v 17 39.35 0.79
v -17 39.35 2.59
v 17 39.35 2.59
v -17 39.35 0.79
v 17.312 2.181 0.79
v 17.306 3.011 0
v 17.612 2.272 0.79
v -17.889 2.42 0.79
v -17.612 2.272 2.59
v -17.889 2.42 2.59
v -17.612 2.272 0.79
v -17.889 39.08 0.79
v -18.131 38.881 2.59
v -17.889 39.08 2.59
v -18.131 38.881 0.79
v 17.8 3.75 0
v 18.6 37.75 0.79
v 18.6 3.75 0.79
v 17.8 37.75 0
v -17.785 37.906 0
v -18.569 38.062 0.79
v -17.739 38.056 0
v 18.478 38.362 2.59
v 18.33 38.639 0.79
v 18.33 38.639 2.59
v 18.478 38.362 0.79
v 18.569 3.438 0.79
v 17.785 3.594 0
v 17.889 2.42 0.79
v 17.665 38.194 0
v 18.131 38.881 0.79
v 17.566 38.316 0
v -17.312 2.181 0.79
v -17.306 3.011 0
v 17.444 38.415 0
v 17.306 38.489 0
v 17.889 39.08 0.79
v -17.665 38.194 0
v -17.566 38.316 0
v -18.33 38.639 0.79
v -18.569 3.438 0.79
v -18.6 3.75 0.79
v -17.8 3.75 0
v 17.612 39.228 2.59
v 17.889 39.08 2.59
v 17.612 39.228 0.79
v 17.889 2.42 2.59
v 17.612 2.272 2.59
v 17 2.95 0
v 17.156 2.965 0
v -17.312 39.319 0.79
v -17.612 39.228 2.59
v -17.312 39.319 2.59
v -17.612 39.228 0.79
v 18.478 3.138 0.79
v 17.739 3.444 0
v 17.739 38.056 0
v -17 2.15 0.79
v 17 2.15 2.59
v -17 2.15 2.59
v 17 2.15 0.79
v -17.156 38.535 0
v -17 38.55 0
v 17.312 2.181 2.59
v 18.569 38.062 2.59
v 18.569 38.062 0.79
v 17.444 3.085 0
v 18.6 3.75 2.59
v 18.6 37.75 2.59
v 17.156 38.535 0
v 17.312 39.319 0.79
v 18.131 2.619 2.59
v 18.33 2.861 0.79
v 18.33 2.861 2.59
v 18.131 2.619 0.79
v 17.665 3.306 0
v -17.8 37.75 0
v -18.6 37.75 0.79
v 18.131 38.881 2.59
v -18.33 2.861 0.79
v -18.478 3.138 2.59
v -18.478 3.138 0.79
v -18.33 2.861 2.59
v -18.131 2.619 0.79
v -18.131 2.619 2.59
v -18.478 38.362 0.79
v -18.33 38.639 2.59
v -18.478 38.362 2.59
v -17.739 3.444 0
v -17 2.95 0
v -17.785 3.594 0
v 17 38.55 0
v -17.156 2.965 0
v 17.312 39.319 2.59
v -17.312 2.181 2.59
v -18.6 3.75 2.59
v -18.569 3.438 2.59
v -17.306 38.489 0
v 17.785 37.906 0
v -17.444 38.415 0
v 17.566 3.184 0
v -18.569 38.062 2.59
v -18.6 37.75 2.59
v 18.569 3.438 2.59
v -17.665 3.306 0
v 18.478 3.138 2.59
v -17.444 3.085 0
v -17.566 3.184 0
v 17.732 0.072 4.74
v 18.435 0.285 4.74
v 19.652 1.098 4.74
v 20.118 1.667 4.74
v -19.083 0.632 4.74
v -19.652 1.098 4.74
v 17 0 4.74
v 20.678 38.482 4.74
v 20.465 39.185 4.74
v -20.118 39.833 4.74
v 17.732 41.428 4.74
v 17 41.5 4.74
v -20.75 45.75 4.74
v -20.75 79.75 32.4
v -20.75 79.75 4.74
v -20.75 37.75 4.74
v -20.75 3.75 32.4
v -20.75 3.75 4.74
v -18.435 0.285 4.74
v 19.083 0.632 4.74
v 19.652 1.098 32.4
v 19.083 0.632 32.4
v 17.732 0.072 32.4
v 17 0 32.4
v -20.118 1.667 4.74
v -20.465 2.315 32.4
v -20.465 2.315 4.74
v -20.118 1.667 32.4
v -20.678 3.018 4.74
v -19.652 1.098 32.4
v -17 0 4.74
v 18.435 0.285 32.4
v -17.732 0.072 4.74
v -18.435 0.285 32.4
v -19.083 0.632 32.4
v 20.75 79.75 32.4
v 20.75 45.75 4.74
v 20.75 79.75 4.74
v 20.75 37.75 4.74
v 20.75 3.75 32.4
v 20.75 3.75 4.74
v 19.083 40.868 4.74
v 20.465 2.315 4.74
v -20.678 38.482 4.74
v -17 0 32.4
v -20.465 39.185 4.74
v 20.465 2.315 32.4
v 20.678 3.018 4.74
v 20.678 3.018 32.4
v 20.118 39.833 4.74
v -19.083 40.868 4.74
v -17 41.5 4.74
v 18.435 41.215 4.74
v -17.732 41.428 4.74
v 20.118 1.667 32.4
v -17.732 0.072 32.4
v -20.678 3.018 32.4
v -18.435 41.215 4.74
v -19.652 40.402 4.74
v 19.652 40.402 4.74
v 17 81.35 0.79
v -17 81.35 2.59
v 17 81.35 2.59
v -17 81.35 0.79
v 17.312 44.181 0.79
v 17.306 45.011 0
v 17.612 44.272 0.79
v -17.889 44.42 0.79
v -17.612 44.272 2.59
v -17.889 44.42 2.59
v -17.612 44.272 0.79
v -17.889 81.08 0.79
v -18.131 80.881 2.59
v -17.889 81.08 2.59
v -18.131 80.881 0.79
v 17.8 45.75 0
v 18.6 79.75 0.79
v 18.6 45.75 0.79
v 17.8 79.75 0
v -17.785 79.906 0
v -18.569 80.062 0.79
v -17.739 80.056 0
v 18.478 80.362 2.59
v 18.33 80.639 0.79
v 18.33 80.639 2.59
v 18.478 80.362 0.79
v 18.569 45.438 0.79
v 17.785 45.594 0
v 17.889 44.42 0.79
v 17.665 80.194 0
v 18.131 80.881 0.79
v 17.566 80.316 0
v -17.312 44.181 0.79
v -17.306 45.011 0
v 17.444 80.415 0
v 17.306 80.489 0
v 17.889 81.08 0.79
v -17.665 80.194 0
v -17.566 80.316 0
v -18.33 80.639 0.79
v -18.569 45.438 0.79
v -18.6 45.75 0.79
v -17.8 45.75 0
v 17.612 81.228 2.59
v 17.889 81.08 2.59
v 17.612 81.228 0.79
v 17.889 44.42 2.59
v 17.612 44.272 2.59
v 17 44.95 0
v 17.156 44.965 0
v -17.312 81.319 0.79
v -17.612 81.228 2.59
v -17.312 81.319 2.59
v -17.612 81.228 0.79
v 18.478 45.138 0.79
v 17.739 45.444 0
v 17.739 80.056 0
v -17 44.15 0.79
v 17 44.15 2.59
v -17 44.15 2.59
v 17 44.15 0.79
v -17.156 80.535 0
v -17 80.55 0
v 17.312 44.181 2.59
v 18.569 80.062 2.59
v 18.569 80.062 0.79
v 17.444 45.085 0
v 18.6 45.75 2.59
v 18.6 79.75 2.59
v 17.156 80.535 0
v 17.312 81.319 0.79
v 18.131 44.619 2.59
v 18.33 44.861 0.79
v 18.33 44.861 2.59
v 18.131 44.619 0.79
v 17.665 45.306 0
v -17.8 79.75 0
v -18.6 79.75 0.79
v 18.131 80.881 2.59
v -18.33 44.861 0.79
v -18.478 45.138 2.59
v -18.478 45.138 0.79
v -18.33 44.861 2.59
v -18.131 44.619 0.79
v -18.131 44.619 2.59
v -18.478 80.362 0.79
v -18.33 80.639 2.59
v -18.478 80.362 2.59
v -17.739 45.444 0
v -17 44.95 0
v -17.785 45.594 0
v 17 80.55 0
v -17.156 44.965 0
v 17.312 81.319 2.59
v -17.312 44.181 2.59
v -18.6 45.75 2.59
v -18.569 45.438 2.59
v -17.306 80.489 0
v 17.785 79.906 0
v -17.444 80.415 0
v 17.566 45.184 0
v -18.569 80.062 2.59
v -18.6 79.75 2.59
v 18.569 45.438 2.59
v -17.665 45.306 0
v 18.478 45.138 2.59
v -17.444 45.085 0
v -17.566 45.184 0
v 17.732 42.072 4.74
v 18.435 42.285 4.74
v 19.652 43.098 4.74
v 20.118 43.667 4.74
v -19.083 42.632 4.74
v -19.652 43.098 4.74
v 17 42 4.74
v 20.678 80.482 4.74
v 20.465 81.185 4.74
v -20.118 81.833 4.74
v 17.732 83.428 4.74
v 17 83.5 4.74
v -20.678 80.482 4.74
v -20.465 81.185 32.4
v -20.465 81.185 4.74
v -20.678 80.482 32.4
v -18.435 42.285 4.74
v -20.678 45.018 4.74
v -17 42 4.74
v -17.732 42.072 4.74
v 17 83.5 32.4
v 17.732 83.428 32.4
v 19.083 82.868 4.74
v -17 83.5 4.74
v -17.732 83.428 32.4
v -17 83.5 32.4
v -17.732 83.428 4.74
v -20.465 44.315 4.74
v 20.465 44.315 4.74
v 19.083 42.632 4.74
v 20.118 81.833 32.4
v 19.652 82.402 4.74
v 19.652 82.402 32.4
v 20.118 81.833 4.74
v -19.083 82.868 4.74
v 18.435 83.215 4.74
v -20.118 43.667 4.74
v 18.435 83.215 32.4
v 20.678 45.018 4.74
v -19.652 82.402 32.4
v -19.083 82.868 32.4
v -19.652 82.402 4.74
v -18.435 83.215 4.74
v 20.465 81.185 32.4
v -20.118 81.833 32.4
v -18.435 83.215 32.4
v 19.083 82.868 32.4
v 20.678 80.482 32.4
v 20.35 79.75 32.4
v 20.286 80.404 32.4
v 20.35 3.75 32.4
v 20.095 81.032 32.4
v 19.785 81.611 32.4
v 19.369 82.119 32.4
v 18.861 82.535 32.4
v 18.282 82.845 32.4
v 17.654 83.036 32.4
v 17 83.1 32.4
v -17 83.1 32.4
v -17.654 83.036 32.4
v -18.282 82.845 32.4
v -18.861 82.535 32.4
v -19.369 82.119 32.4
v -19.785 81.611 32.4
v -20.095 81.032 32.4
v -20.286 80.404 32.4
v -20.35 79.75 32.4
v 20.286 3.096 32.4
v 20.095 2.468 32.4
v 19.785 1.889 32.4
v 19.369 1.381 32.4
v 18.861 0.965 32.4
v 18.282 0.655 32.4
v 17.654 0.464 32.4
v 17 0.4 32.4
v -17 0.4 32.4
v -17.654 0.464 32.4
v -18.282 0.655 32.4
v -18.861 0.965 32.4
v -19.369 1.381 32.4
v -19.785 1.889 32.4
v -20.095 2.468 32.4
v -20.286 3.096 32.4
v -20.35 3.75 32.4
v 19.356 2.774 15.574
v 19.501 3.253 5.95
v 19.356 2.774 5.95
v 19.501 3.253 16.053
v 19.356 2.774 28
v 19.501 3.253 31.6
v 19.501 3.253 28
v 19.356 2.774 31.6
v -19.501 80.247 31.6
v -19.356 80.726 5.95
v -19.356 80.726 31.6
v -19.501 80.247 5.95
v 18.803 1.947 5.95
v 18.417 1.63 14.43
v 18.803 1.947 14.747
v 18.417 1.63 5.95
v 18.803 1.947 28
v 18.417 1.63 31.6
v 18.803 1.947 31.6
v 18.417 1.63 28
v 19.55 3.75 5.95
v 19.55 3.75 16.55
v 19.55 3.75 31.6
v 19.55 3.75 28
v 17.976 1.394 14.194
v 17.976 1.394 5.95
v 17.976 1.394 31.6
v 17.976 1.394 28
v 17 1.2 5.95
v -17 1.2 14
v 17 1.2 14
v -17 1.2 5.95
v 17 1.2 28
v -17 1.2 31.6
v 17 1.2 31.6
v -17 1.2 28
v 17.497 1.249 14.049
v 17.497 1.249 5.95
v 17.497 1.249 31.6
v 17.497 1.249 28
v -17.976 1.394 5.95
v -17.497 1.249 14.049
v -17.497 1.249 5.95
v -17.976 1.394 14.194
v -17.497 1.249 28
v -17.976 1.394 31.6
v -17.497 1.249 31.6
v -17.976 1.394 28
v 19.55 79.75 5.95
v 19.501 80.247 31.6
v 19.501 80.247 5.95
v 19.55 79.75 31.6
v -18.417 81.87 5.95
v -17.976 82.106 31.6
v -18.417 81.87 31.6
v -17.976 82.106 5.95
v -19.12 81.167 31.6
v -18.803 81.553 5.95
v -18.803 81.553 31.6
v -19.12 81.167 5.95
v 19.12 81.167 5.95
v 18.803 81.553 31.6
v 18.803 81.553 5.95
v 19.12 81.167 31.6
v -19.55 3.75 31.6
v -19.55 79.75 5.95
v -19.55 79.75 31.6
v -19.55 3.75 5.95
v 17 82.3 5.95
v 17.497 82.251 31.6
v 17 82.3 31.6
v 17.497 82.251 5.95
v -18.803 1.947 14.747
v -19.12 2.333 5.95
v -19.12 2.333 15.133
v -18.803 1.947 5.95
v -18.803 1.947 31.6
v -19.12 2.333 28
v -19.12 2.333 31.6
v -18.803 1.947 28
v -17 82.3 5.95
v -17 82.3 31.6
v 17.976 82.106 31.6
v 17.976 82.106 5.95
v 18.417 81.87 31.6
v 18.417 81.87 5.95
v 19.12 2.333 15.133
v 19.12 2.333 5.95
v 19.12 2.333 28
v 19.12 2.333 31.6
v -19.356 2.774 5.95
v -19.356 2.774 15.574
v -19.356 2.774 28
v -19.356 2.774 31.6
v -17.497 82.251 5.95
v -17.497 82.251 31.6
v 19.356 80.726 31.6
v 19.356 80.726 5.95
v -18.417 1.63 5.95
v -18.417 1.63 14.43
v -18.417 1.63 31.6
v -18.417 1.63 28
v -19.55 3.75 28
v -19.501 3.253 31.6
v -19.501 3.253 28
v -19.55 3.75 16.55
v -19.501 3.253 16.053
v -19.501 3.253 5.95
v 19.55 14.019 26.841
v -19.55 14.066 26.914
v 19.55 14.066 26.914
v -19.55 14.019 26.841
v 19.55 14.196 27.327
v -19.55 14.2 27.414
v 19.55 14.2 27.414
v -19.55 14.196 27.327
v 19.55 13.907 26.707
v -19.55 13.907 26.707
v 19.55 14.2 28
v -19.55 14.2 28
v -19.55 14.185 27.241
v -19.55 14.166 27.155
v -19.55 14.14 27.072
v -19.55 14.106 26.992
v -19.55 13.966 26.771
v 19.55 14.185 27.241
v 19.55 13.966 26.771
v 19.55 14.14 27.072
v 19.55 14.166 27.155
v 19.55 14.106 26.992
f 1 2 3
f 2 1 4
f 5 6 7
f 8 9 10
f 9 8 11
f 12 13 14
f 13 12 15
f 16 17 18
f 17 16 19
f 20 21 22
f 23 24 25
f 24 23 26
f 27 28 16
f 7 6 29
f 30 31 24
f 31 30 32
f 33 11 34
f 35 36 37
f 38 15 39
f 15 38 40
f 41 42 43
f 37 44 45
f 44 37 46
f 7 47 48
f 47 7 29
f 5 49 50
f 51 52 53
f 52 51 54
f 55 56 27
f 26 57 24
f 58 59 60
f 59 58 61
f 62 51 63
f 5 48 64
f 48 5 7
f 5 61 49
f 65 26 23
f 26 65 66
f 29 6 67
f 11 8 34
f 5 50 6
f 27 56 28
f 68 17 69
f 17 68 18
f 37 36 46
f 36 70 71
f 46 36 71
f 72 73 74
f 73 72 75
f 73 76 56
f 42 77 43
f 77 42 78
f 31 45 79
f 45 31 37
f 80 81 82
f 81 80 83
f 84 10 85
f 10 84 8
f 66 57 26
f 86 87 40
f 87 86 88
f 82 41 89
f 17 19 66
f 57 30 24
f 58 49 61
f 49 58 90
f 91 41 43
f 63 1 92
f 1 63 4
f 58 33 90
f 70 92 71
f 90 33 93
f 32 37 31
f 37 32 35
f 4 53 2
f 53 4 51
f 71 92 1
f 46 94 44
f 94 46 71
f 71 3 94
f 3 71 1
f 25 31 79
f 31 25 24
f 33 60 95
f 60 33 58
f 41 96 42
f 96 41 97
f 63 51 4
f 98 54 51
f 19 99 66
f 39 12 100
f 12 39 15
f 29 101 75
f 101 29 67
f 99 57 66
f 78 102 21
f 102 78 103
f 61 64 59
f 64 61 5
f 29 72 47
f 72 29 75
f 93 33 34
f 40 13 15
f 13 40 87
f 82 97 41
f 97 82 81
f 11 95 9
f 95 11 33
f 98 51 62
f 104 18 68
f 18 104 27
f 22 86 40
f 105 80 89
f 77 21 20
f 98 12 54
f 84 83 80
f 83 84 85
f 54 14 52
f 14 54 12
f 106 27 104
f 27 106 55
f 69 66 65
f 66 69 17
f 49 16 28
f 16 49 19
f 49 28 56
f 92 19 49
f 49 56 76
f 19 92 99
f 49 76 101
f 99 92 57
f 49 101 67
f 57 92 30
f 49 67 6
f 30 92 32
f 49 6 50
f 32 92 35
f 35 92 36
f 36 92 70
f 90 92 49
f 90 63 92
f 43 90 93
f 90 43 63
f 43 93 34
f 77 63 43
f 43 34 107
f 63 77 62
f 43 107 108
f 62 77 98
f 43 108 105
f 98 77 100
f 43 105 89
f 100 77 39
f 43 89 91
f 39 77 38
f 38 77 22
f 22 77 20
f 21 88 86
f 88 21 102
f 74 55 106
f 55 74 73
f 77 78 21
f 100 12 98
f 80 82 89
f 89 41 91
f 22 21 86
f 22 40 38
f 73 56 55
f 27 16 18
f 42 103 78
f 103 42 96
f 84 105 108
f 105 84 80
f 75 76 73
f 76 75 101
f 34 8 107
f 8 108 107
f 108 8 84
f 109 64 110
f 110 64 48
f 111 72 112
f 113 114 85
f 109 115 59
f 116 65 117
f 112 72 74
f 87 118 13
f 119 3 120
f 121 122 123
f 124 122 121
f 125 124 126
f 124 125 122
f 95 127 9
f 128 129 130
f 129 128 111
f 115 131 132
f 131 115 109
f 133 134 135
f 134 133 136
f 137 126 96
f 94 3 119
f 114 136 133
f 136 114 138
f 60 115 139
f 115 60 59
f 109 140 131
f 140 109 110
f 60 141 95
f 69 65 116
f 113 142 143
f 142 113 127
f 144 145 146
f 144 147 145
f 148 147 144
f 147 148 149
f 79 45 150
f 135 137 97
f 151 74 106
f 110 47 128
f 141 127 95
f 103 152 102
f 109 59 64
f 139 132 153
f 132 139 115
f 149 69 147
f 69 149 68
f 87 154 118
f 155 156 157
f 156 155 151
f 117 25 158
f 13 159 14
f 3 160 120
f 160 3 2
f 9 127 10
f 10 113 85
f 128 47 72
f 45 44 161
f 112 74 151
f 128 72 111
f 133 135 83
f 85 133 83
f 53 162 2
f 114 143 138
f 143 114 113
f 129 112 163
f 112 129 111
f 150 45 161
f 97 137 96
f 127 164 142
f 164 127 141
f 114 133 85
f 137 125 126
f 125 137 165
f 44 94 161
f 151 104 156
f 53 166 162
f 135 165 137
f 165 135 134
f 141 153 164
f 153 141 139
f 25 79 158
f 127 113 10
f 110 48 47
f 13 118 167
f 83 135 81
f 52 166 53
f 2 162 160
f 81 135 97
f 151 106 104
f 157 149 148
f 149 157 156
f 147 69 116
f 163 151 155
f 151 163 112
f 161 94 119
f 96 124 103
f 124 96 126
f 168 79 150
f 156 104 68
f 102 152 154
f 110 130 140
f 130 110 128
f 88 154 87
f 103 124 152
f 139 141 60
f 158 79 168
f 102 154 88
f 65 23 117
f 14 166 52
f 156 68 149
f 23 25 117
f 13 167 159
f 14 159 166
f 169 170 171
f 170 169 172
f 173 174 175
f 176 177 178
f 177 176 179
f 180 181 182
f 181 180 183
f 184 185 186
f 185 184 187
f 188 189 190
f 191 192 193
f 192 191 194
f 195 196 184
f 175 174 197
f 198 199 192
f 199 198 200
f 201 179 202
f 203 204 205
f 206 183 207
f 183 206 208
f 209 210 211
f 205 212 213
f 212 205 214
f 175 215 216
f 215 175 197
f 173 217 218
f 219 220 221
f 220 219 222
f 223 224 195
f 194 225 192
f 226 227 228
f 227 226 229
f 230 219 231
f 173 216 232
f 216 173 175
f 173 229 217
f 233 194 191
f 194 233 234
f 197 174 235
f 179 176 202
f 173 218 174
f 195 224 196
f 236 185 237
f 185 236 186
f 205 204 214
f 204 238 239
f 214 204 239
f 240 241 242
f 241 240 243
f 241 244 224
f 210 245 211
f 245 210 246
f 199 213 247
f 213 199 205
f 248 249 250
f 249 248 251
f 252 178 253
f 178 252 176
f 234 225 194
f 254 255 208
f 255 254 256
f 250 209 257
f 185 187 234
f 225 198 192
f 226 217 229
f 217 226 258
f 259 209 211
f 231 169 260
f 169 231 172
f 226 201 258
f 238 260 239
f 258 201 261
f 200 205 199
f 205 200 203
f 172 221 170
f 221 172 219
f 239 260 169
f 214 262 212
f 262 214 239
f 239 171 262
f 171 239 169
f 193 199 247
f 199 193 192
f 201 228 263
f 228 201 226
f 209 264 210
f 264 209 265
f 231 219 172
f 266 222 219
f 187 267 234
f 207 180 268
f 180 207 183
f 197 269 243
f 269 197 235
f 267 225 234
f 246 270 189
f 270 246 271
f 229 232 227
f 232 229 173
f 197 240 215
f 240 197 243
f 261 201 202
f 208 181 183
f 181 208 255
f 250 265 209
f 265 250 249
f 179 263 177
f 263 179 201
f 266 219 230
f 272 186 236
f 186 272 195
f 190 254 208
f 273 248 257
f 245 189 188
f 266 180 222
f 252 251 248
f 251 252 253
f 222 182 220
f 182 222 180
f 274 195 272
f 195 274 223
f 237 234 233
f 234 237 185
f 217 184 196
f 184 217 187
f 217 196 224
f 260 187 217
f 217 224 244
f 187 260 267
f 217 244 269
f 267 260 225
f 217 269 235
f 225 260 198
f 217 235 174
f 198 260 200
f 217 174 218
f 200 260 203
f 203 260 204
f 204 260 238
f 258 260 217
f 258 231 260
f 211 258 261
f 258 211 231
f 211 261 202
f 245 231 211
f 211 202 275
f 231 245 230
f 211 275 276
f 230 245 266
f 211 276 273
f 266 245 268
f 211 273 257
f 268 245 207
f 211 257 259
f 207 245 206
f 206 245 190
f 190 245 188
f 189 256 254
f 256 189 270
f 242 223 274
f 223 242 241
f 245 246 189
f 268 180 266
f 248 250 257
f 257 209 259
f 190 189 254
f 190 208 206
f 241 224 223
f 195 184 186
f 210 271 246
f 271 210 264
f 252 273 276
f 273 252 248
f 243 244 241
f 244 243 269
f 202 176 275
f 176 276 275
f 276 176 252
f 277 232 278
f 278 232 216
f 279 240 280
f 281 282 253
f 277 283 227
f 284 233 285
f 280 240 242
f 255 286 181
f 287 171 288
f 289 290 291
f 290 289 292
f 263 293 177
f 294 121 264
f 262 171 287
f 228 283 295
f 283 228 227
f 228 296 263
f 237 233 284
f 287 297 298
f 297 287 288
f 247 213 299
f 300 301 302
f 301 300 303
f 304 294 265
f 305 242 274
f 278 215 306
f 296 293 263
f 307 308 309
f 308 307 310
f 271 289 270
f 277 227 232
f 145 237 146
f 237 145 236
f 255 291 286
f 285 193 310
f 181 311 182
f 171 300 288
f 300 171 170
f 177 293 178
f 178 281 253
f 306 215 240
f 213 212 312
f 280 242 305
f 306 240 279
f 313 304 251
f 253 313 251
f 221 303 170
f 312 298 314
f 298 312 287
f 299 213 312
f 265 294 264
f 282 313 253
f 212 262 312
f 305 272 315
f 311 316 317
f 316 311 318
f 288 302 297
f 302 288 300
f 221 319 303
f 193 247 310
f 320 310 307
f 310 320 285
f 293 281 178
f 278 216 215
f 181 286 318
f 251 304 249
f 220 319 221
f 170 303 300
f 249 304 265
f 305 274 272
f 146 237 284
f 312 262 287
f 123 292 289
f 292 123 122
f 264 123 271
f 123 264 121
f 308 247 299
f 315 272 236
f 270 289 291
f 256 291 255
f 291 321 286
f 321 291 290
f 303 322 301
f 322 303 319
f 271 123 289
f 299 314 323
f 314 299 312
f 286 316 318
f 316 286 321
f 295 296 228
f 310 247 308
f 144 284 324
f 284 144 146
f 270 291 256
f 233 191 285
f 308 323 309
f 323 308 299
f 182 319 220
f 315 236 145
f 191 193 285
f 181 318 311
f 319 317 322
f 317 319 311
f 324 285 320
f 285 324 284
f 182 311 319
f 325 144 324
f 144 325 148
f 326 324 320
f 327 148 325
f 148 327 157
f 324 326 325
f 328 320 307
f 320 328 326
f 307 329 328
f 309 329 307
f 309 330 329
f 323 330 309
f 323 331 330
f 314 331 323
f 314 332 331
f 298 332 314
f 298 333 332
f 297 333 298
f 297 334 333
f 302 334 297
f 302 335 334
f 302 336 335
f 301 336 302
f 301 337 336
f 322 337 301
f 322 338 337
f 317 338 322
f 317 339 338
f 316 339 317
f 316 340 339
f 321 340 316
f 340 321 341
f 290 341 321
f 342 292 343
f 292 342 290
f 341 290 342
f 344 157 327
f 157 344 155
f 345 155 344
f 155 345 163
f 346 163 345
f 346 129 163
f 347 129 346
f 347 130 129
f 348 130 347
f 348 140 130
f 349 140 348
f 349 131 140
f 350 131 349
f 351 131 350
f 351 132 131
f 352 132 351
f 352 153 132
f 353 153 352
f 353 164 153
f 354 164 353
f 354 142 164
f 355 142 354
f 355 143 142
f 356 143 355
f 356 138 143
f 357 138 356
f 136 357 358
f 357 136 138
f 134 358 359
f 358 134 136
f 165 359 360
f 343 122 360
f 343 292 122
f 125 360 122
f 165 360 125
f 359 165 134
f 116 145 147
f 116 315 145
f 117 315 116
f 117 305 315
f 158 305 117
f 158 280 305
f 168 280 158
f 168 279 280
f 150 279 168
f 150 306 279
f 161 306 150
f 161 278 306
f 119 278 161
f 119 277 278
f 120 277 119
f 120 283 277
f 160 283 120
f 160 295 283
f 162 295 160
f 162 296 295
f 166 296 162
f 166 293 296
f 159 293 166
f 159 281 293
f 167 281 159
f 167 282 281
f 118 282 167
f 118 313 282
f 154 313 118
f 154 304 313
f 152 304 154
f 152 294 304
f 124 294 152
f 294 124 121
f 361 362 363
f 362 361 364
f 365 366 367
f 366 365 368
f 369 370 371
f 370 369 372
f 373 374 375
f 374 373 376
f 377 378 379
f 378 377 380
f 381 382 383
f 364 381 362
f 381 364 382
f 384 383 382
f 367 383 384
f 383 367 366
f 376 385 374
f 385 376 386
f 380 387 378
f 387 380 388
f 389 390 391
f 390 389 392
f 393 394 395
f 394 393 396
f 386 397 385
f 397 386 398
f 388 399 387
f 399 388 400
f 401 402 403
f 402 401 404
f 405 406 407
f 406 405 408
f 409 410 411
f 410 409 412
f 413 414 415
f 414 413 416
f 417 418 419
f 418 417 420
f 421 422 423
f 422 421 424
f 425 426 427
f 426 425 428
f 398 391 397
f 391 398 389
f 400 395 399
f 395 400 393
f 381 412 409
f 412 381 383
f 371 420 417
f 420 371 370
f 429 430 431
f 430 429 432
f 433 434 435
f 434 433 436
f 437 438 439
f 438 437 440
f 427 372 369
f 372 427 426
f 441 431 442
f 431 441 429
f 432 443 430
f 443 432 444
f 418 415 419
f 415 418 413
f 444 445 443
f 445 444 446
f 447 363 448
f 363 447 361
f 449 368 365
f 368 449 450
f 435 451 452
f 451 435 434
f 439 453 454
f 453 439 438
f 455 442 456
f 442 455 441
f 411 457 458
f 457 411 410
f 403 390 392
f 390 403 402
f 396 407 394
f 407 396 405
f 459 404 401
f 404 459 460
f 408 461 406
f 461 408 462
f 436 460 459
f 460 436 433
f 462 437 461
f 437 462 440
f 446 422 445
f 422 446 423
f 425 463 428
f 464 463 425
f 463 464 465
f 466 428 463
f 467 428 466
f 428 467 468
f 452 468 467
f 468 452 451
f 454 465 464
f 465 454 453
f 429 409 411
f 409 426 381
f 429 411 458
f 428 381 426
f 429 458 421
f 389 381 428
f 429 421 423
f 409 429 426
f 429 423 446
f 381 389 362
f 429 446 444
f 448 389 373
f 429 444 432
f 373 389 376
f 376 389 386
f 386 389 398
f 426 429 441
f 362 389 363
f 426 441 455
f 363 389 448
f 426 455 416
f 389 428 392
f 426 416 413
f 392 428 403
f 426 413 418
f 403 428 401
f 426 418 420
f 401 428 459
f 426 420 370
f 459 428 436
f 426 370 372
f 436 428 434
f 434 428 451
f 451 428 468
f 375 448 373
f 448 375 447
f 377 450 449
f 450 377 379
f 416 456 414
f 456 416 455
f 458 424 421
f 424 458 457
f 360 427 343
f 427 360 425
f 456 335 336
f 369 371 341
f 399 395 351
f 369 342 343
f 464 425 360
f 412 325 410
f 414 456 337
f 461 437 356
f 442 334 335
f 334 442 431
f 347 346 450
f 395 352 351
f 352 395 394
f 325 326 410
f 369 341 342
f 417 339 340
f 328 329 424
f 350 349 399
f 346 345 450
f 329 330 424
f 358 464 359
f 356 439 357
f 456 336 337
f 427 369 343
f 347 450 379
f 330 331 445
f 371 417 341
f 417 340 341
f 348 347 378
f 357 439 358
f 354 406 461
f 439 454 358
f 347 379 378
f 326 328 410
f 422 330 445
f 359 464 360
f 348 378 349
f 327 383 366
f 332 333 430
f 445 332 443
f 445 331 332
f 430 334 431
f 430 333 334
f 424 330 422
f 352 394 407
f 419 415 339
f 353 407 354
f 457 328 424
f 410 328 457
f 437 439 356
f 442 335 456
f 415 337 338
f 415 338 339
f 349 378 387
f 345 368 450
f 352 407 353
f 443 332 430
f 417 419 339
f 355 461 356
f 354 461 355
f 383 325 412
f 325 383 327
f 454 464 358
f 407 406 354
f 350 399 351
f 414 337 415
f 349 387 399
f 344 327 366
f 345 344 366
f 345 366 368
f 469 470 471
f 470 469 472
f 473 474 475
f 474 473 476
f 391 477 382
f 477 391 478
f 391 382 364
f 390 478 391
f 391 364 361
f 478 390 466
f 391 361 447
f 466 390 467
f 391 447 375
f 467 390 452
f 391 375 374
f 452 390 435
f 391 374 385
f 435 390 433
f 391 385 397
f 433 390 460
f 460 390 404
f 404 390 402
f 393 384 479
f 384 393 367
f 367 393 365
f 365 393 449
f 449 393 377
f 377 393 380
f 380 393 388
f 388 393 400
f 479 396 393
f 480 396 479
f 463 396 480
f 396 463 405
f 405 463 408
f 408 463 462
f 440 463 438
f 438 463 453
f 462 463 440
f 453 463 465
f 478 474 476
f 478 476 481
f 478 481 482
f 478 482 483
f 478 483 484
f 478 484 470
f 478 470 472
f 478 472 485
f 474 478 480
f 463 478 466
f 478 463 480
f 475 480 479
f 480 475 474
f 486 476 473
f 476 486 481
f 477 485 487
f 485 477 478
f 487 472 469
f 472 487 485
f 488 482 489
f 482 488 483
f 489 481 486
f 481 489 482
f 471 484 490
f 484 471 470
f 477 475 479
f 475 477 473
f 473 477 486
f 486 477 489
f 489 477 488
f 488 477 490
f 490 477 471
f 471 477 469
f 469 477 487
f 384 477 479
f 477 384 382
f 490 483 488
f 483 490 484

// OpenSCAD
// file: ../../modules/gridfinity.scad
// Gridfinity ベースプレートの共有 module。
// 寸法は Gridfinity 仕様 (Zack Freedman) の baseplate 輪郭に従う:
//   ピッチ 42、ソケット上端開口 41.5 (角 R4)、上から 45° 面取り 2.15 →
//   垂直 1.8 (37.2 角・R1.85) → 45° 面取り 0.7 → 底 35.8 角 (R1.15)。
//   ソケット深さ = 2.15 + 1.8 + 0.7 = 4.65。
//
// 座標系: X が列方向 (中央が 0)、Y が行方向 (板の前端が 0)、Z=0 が板の底面。
// 板の外形は grid とは独立に rim で与えるので、grid より大きい板 (縁付き) を
// 作れる。ソケットは rim=[left, right, front, back] の内側へ 42 ピッチで並ぶ。

gf_pitch = 42;
gf_socket_top = 41.5; // 上端開口
gf_socket_mid = 37.2; // 垂直部
gf_socket_bot = 35.8; // 底
gf_socket_r_top = 4;
gf_socket_r_mid = 1.85;
gf_socket_r_bot = 1.15;
gf_chamfer_top = 2.15;
gf_wall_h = 1.8;
gf_chamfer_bot = 0.7;
gf_socket_depth = gf_chamfer_top + gf_wall_h + gf_chamfer_bot; // 4.65
gf_fn = 32;
gf_eps = 0.01; // hull 用の薄板の厚さ
gf_over = 0.5; // 切削の抜き代

// 角丸正方形 (一辺 w、角 R)
module
gf_rounded_square(w, r)
{
    offset(r = r, $fn = gf_fn) square(w - 2 * r, center = true);
}

// 厚さ gf_eps の角丸正方形の薄板を z に置く (hull の骨)
module
gf_slab(w, r, z)
{
    translate([ 0, 0, z ]) linear_extrude(gf_eps) gf_rounded_square(w, r);
}

// ソケット1個の切削体。z=0 がソケットの底 (床の天面)、+Z へ 4.65 で天面に出る。
// clearance は嵌合の逃げで、輪郭を全周へ clearance だけ外へ出す (幅 +2c、角 R
// +c)。 既定 0 が Gridfinity の公称輪郭。深さとピッチは変えない
module
gf_socket_cut(clearance = 0)
{
    z1 = gf_chamfer_bot;
    z2 = z1 + gf_wall_h;
    z3 = gf_socket_depth;
    c = clearance;
    hull()
    {
        gf_slab(gf_socket_bot + 2 * c, gf_socket_r_bot + c, 0);
        gf_slab(gf_socket_mid + 2 * c, gf_socket_r_mid + c, z1 - gf_eps);
    }
    hull()
    {
        gf_slab(gf_socket_mid + 2 * c, gf_socket_r_mid + c, z1 - gf_eps);
        gf_slab(gf_socket_mid + 2 * c, gf_socket_r_mid + c, z2 - gf_eps);
    }
    hull()
    {
        gf_slab(gf_socket_mid + 2 * c, gf_socket_r_mid + c, z2 - gf_eps);
        gf_slab(gf_socket_top + 2 * c, gf_socket_r_top + c, z3 - gf_eps);
    }
    // 天面より上へ抜く (天面と同一平面の退化した面を残さない)
    gf_slab(gf_socket_top + 2 * c, gf_socket_r_top + c, z3 - gf_eps);
    translate([ 0, 0, z3 - gf_eps ]) linear_extrude(gf_over + gf_eps)
        gf_rounded_square(gf_socket_top + 2 * c, gf_socket_r_top + c);
}

// ベースプレート。cols x rows のソケットを床 floor_t の上に彫る。
// rim = [left, right, front, back] はソケット列の外側に残す縁の幅。
// 板の幅 = cols*42 + left + right、奥行き = rows*42 + front + back。
// clearance はソケットの嵌合の逃げ (gf_socket_cut を参照)。
module
gf_baseplate(cols, rows, rim = [ 0, 0, 0, 0 ], floor_t = 1, clearance = 0)
{
    grid_w = cols * gf_pitch;
    grid_d = rows * gf_pitch;
    plate_w = grid_w + rim[0] + rim[1];
    plate_d = grid_d + rim[2] + rim[3];
    x0 = -plate_w / 2 + rim[0]; // ソケット列の左端
    difference()
    {
        translate([ -plate_w / 2, 0, 0 ])
            cube([ plate_w, plate_d, floor_t + gf_socket_depth ]);
        for (c = [0:cols - 1], r = [0:rows - 1])
            translate([
                x0 + (c + 0.5) * gf_pitch,
                rim[2] + (r + 0.5) * gf_pitch,
                floor_t
            ]) gf_socket_cut(clearance);
    }
}
// file: ../../modules/gridfinity_bin.scad
include <gridfinity.scad>

// Gridfinity bin (箱) の共有 module。ピッチと角丸は gridfinity.scad
// と共有する。 底の輪郭は Gridfinity 仕様の bin base (下から):
//   35.6 角 (R0.8) → 45° 0.8 → 37.2 角 (R1.6) → 垂直 1.8 → 45° 2.15 → 41.5 角
//   (R3.75) 高さ 0.8 + 1.8 + 2.15 = 4.75。磁石穴・ネジ穴は持たない (無垢)
// 外形はピッチ − 0.5 (1 マス 41.5)、角 R3.75。高さ単位 7 (4U = 28 が壁の上端)。
// リップは「薄いリップ」: 壁 (1.2) をそのまま lip_h (4.4) 伸ばし、内側の上端を
// 45° に落とすだけ。内側に棚 (厚い肉) を持たないので、上に載せる bin は底の
// 面取りをこの 45° に座らせる。
//
// 座標系: X が列方向 (中央 0)、Y が行方向 (手前 = ラベル側が 0)、Z=0 が底面。

gfb_outer = gf_pitch - 0.5; // 41.5
gfb_outer_r = 3.75;
gfb_base_bot = 35.6;
gfb_base_bot_r = 0.8;
gfb_base_mid = 37.2;
gfb_base_mid_r = 1.6;
gfb_base_chamfer_bot = 0.8;
gfb_base_wall_h = 1.8;
gfb_base_chamfer_top = 2.15;
gfb_base_h =
    gfb_base_chamfer_bot + gfb_base_wall_h + gfb_base_chamfer_top; // 4.75
gfb_unit = 7;
gfb_lip_h = 4.4;
gfb_lip_chamfer = 0.8;

// bin 1 マスぶんの底 (無垢)。z=0 が底面、gfb_base_h で外形 41.5 角に達する
module
gfb_base_cell()
{
    z1 = gfb_base_chamfer_bot;
    z2 = z1 + gfb_base_wall_h;
    z3 = gfb_base_h;
    hull()
    {
        gf_slab(gfb_base_bot, gfb_base_bot_r, 0);
        gf_slab(gfb_base_mid, gfb_base_mid_r, z1 - gf_eps);
    }
    hull()
    {
        gf_slab(gfb_base_mid, gfb_base_mid_r, z1 - gf_eps);
        gf_slab(gfb_base_mid, gfb_base_mid_r, z2 - gf_eps);
    }
    hull()
    {
        gf_slab(gfb_base_mid, gfb_base_mid_r, z2 - gf_eps);
        gf_slab(gfb_outer, gfb_outer_r, z3 - gf_eps);
    }
}

// cols x rows の角丸矩形 (外形)
module
gfb_footprint(cols, rows, inset = 0)
{
    w = cols * gf_pitch - 0.5 - 2 * inset;
    d = rows * gf_pitch - 0.5 - 2 * inset;
    translate([ 0, d / 2 + inset ])
        gf_rounded_square_wd(w, d, gfb_outer_r - inset);
}

// 幅 w × 奥行き d の角丸矩形 (中心が原点)
module
gf_rounded_square_wd(w, d, r)
{
    offset(r = r, $fn = gf_fn) square([ w - 2 * r, d - 2 * r ], center = true);
}

// ラベル天板の Y-Z 断面 (y = 壁の内面からの距離、z = 高さ)。天板 (厚さ t) の
// 先端から 45° の斜面が壁まで下りる無垢のくさび。先端の垂直面と斜面の境目
// (135°) を半径 r で丸める: 円弧の中心は先端の角から (-r, r·tan22.5°)、接点は
// 垂直面上の角 + (0, r·tan22.5°) と斜面上の角 + 0.4142r·(-1,-1)。壁の内側へ
// 1 だけ食い込ませて胴体と溶かす
function gfb_label_profile(d, t, h, r) =
    let(y0 = d, z0 = h - t, cy = y0 - r, cz = z0 + r * tan(22.5))
        concat([ [ -1, h ], [ d, h ] ],
               [for (a = [0:-5:-45])[cy + r * cos(a), cz + r* sin(a)]],
               [[ -1, h - t - d - 1 ]]);

// bin 本体。units は高さ (U)。wall / floor_t は壁と床の厚さ。
// label_d > 0 なら手前 (y=0) の壁の上端 (z = units*7) と面一で内側へ label_d
// 張り出す厚さ label_t のラベル天板を付ける。天板の下は 45° の無垢のくさびが
// 壁まで下りる (ブリッジもリブも無い。中身はスライサのインフィル任せ)。
// 天板の先端と 45° 面の境目は半径 label_r で丸める
module
gfb_bin(cols,
        rows,
        units = 4,
        wall = 1.2,
        floor_t = 1.2,
        label_d = 0,
        label_t = 1,
        label_r = 1)
{
    h = units * gfb_unit; // 壁の上端
    top = h + gfb_lip_h;  // リップの上端
    inner_w = cols * gf_pitch - 0.5 - 2 * wall;
    floor_top = gfb_base_h + floor_t;
    union()
    {
        // 底: マスごとの無垢の base
        for (c = [0:cols - 1], r = [0:rows - 1])
            translate([
                (c - (cols - 1) / 2) * gf_pitch,
                (r + 0.5) * gf_pitch - 0.25,
                0
            ]) gfb_base_cell();
        // 胴体: base の上から top
        // まで。内側は床の上を抜く。リップの内側の上端は 45°
        difference()
        {
            translate([ 0, 0, gfb_base_h - gf_eps ])
                linear_extrude(top - gfb_base_h + gf_eps)
                    gfb_footprint(cols, rows);
            translate([ 0, 0, floor_top ])
                linear_extrude(top - floor_top + gf_over)
                    gfb_footprint(cols, rows, wall);
            // リップ内側の面取り: 上端で wall − 0.4 まで開く
            hull()
            {
                translate([ 0, 0, top - gfb_lip_chamfer ])
                    linear_extrude(gf_eps) gfb_footprint(cols, rows, wall);
                translate([ 0, 0, top ]) linear_extrude(gf_over)
                    gfb_footprint(cols, rows, wall - gfb_lip_chamfer);
            }
        }
        // ラベル天板と 45° くさび (内幅いっぱい、同じ断面)。壁へ 1 食い込ませた
        // 矩形の柱なので、角の丸み (R3.75) の外へ出ないよう外形で切り取る
        if (label_d > 0)
            intersection()
            {
                translate([ -inner_w / 2, wall, 0 ]) rotate([ 90, 0, 90 ])
                    linear_extrude(inner_w) polygon(
                        gfb_label_profile(label_d, label_t, h, label_r));
                linear_extrude(top) gfb_footprint(cols, rows);
            }
    }
}
// file: ../../modules/gridfinity_bin_4u.scad
include <gridfinity_bin.scad>

// assets/gridfinity-bin/ の bin 群の共通値と、サイズ 3 引数の払い出し口。
// 単体では何も描かない。設計の経緯と確定値は
// ledger/designs/gridfinity-bin-4u.md が正本。 保証する範囲は cols 1..2 ×
// rows 1..5 × units 4 (assets に並ぶ 10 種)。 cols が X (横)、rows が Y
// (ラベルの壁から奥へ)、units が高さ (7mm 単位)。
wall = 1.2;    // 0.4 ノズル 3 本
floor_t = 1.2; // 底 (4.75) の上に載せる床。床の天面 z = 5.95
label_d = 13;  // 12mm 幅のラベルシールを貼る天板の張り出し
label_t = 1; // 天板の厚さ (user 指定)。下は 45° の無垢のくさび
label_r = 1; // 天板の先端と 45° 面の境目の R (user 指定)

function bin_contract(cols, rows, units) = str("CONTRACT units=",
                                               units,
                                               " pitch=",
                                               gf_pitch,
                                               " outer=",
                                               gfb_outer,
                                               " h=",
                                               units* gfb_unit,
                                               " lip=",
                                               gfb_lip_h,
                                               " base=",
                                               gfb_base_bot,
                                               "/",
                                               gfb_base_mid,
                                               "/",
                                               gfb_outer,
                                               " base_h=",
                                               gfb_base_h,
                                               " wall=",
                                               wall,
                                               " floor_top=",
                                               gfb_base_h + floor_t,
                                               " label=",
                                               label_d,
                                               "x",
                                               label_t,
                                               " wedge=45 fillet=",
                                               label_r,
                                               " bin=",
                                               cols,
                                               "x",
                                               rows,
                                               " size=",
                                               cols* gf_pitch - 0.5,
                                               "x",
                                               rows* gf_pitch - 0.5);

// (cols, rows, units) でラベル付き bin を払い出す。例: gridfinity_bin(2, 4, 4)
module
gridfinity_bin(cols, rows, units = 4)
{
    echo(bin_contract(cols, rows, units));
    gfb_bin(cols, rows, units, wall, floor_t, label_d, label_t, label_r);
}
// main file
include <../../modules/gridfinity_bin_4u.scad>

// 1x2 マス、高さ 4U のラベル天板付き bin。ラベルは手前 (y=0) 側
gridfinity_bin(1, 2, 4);
